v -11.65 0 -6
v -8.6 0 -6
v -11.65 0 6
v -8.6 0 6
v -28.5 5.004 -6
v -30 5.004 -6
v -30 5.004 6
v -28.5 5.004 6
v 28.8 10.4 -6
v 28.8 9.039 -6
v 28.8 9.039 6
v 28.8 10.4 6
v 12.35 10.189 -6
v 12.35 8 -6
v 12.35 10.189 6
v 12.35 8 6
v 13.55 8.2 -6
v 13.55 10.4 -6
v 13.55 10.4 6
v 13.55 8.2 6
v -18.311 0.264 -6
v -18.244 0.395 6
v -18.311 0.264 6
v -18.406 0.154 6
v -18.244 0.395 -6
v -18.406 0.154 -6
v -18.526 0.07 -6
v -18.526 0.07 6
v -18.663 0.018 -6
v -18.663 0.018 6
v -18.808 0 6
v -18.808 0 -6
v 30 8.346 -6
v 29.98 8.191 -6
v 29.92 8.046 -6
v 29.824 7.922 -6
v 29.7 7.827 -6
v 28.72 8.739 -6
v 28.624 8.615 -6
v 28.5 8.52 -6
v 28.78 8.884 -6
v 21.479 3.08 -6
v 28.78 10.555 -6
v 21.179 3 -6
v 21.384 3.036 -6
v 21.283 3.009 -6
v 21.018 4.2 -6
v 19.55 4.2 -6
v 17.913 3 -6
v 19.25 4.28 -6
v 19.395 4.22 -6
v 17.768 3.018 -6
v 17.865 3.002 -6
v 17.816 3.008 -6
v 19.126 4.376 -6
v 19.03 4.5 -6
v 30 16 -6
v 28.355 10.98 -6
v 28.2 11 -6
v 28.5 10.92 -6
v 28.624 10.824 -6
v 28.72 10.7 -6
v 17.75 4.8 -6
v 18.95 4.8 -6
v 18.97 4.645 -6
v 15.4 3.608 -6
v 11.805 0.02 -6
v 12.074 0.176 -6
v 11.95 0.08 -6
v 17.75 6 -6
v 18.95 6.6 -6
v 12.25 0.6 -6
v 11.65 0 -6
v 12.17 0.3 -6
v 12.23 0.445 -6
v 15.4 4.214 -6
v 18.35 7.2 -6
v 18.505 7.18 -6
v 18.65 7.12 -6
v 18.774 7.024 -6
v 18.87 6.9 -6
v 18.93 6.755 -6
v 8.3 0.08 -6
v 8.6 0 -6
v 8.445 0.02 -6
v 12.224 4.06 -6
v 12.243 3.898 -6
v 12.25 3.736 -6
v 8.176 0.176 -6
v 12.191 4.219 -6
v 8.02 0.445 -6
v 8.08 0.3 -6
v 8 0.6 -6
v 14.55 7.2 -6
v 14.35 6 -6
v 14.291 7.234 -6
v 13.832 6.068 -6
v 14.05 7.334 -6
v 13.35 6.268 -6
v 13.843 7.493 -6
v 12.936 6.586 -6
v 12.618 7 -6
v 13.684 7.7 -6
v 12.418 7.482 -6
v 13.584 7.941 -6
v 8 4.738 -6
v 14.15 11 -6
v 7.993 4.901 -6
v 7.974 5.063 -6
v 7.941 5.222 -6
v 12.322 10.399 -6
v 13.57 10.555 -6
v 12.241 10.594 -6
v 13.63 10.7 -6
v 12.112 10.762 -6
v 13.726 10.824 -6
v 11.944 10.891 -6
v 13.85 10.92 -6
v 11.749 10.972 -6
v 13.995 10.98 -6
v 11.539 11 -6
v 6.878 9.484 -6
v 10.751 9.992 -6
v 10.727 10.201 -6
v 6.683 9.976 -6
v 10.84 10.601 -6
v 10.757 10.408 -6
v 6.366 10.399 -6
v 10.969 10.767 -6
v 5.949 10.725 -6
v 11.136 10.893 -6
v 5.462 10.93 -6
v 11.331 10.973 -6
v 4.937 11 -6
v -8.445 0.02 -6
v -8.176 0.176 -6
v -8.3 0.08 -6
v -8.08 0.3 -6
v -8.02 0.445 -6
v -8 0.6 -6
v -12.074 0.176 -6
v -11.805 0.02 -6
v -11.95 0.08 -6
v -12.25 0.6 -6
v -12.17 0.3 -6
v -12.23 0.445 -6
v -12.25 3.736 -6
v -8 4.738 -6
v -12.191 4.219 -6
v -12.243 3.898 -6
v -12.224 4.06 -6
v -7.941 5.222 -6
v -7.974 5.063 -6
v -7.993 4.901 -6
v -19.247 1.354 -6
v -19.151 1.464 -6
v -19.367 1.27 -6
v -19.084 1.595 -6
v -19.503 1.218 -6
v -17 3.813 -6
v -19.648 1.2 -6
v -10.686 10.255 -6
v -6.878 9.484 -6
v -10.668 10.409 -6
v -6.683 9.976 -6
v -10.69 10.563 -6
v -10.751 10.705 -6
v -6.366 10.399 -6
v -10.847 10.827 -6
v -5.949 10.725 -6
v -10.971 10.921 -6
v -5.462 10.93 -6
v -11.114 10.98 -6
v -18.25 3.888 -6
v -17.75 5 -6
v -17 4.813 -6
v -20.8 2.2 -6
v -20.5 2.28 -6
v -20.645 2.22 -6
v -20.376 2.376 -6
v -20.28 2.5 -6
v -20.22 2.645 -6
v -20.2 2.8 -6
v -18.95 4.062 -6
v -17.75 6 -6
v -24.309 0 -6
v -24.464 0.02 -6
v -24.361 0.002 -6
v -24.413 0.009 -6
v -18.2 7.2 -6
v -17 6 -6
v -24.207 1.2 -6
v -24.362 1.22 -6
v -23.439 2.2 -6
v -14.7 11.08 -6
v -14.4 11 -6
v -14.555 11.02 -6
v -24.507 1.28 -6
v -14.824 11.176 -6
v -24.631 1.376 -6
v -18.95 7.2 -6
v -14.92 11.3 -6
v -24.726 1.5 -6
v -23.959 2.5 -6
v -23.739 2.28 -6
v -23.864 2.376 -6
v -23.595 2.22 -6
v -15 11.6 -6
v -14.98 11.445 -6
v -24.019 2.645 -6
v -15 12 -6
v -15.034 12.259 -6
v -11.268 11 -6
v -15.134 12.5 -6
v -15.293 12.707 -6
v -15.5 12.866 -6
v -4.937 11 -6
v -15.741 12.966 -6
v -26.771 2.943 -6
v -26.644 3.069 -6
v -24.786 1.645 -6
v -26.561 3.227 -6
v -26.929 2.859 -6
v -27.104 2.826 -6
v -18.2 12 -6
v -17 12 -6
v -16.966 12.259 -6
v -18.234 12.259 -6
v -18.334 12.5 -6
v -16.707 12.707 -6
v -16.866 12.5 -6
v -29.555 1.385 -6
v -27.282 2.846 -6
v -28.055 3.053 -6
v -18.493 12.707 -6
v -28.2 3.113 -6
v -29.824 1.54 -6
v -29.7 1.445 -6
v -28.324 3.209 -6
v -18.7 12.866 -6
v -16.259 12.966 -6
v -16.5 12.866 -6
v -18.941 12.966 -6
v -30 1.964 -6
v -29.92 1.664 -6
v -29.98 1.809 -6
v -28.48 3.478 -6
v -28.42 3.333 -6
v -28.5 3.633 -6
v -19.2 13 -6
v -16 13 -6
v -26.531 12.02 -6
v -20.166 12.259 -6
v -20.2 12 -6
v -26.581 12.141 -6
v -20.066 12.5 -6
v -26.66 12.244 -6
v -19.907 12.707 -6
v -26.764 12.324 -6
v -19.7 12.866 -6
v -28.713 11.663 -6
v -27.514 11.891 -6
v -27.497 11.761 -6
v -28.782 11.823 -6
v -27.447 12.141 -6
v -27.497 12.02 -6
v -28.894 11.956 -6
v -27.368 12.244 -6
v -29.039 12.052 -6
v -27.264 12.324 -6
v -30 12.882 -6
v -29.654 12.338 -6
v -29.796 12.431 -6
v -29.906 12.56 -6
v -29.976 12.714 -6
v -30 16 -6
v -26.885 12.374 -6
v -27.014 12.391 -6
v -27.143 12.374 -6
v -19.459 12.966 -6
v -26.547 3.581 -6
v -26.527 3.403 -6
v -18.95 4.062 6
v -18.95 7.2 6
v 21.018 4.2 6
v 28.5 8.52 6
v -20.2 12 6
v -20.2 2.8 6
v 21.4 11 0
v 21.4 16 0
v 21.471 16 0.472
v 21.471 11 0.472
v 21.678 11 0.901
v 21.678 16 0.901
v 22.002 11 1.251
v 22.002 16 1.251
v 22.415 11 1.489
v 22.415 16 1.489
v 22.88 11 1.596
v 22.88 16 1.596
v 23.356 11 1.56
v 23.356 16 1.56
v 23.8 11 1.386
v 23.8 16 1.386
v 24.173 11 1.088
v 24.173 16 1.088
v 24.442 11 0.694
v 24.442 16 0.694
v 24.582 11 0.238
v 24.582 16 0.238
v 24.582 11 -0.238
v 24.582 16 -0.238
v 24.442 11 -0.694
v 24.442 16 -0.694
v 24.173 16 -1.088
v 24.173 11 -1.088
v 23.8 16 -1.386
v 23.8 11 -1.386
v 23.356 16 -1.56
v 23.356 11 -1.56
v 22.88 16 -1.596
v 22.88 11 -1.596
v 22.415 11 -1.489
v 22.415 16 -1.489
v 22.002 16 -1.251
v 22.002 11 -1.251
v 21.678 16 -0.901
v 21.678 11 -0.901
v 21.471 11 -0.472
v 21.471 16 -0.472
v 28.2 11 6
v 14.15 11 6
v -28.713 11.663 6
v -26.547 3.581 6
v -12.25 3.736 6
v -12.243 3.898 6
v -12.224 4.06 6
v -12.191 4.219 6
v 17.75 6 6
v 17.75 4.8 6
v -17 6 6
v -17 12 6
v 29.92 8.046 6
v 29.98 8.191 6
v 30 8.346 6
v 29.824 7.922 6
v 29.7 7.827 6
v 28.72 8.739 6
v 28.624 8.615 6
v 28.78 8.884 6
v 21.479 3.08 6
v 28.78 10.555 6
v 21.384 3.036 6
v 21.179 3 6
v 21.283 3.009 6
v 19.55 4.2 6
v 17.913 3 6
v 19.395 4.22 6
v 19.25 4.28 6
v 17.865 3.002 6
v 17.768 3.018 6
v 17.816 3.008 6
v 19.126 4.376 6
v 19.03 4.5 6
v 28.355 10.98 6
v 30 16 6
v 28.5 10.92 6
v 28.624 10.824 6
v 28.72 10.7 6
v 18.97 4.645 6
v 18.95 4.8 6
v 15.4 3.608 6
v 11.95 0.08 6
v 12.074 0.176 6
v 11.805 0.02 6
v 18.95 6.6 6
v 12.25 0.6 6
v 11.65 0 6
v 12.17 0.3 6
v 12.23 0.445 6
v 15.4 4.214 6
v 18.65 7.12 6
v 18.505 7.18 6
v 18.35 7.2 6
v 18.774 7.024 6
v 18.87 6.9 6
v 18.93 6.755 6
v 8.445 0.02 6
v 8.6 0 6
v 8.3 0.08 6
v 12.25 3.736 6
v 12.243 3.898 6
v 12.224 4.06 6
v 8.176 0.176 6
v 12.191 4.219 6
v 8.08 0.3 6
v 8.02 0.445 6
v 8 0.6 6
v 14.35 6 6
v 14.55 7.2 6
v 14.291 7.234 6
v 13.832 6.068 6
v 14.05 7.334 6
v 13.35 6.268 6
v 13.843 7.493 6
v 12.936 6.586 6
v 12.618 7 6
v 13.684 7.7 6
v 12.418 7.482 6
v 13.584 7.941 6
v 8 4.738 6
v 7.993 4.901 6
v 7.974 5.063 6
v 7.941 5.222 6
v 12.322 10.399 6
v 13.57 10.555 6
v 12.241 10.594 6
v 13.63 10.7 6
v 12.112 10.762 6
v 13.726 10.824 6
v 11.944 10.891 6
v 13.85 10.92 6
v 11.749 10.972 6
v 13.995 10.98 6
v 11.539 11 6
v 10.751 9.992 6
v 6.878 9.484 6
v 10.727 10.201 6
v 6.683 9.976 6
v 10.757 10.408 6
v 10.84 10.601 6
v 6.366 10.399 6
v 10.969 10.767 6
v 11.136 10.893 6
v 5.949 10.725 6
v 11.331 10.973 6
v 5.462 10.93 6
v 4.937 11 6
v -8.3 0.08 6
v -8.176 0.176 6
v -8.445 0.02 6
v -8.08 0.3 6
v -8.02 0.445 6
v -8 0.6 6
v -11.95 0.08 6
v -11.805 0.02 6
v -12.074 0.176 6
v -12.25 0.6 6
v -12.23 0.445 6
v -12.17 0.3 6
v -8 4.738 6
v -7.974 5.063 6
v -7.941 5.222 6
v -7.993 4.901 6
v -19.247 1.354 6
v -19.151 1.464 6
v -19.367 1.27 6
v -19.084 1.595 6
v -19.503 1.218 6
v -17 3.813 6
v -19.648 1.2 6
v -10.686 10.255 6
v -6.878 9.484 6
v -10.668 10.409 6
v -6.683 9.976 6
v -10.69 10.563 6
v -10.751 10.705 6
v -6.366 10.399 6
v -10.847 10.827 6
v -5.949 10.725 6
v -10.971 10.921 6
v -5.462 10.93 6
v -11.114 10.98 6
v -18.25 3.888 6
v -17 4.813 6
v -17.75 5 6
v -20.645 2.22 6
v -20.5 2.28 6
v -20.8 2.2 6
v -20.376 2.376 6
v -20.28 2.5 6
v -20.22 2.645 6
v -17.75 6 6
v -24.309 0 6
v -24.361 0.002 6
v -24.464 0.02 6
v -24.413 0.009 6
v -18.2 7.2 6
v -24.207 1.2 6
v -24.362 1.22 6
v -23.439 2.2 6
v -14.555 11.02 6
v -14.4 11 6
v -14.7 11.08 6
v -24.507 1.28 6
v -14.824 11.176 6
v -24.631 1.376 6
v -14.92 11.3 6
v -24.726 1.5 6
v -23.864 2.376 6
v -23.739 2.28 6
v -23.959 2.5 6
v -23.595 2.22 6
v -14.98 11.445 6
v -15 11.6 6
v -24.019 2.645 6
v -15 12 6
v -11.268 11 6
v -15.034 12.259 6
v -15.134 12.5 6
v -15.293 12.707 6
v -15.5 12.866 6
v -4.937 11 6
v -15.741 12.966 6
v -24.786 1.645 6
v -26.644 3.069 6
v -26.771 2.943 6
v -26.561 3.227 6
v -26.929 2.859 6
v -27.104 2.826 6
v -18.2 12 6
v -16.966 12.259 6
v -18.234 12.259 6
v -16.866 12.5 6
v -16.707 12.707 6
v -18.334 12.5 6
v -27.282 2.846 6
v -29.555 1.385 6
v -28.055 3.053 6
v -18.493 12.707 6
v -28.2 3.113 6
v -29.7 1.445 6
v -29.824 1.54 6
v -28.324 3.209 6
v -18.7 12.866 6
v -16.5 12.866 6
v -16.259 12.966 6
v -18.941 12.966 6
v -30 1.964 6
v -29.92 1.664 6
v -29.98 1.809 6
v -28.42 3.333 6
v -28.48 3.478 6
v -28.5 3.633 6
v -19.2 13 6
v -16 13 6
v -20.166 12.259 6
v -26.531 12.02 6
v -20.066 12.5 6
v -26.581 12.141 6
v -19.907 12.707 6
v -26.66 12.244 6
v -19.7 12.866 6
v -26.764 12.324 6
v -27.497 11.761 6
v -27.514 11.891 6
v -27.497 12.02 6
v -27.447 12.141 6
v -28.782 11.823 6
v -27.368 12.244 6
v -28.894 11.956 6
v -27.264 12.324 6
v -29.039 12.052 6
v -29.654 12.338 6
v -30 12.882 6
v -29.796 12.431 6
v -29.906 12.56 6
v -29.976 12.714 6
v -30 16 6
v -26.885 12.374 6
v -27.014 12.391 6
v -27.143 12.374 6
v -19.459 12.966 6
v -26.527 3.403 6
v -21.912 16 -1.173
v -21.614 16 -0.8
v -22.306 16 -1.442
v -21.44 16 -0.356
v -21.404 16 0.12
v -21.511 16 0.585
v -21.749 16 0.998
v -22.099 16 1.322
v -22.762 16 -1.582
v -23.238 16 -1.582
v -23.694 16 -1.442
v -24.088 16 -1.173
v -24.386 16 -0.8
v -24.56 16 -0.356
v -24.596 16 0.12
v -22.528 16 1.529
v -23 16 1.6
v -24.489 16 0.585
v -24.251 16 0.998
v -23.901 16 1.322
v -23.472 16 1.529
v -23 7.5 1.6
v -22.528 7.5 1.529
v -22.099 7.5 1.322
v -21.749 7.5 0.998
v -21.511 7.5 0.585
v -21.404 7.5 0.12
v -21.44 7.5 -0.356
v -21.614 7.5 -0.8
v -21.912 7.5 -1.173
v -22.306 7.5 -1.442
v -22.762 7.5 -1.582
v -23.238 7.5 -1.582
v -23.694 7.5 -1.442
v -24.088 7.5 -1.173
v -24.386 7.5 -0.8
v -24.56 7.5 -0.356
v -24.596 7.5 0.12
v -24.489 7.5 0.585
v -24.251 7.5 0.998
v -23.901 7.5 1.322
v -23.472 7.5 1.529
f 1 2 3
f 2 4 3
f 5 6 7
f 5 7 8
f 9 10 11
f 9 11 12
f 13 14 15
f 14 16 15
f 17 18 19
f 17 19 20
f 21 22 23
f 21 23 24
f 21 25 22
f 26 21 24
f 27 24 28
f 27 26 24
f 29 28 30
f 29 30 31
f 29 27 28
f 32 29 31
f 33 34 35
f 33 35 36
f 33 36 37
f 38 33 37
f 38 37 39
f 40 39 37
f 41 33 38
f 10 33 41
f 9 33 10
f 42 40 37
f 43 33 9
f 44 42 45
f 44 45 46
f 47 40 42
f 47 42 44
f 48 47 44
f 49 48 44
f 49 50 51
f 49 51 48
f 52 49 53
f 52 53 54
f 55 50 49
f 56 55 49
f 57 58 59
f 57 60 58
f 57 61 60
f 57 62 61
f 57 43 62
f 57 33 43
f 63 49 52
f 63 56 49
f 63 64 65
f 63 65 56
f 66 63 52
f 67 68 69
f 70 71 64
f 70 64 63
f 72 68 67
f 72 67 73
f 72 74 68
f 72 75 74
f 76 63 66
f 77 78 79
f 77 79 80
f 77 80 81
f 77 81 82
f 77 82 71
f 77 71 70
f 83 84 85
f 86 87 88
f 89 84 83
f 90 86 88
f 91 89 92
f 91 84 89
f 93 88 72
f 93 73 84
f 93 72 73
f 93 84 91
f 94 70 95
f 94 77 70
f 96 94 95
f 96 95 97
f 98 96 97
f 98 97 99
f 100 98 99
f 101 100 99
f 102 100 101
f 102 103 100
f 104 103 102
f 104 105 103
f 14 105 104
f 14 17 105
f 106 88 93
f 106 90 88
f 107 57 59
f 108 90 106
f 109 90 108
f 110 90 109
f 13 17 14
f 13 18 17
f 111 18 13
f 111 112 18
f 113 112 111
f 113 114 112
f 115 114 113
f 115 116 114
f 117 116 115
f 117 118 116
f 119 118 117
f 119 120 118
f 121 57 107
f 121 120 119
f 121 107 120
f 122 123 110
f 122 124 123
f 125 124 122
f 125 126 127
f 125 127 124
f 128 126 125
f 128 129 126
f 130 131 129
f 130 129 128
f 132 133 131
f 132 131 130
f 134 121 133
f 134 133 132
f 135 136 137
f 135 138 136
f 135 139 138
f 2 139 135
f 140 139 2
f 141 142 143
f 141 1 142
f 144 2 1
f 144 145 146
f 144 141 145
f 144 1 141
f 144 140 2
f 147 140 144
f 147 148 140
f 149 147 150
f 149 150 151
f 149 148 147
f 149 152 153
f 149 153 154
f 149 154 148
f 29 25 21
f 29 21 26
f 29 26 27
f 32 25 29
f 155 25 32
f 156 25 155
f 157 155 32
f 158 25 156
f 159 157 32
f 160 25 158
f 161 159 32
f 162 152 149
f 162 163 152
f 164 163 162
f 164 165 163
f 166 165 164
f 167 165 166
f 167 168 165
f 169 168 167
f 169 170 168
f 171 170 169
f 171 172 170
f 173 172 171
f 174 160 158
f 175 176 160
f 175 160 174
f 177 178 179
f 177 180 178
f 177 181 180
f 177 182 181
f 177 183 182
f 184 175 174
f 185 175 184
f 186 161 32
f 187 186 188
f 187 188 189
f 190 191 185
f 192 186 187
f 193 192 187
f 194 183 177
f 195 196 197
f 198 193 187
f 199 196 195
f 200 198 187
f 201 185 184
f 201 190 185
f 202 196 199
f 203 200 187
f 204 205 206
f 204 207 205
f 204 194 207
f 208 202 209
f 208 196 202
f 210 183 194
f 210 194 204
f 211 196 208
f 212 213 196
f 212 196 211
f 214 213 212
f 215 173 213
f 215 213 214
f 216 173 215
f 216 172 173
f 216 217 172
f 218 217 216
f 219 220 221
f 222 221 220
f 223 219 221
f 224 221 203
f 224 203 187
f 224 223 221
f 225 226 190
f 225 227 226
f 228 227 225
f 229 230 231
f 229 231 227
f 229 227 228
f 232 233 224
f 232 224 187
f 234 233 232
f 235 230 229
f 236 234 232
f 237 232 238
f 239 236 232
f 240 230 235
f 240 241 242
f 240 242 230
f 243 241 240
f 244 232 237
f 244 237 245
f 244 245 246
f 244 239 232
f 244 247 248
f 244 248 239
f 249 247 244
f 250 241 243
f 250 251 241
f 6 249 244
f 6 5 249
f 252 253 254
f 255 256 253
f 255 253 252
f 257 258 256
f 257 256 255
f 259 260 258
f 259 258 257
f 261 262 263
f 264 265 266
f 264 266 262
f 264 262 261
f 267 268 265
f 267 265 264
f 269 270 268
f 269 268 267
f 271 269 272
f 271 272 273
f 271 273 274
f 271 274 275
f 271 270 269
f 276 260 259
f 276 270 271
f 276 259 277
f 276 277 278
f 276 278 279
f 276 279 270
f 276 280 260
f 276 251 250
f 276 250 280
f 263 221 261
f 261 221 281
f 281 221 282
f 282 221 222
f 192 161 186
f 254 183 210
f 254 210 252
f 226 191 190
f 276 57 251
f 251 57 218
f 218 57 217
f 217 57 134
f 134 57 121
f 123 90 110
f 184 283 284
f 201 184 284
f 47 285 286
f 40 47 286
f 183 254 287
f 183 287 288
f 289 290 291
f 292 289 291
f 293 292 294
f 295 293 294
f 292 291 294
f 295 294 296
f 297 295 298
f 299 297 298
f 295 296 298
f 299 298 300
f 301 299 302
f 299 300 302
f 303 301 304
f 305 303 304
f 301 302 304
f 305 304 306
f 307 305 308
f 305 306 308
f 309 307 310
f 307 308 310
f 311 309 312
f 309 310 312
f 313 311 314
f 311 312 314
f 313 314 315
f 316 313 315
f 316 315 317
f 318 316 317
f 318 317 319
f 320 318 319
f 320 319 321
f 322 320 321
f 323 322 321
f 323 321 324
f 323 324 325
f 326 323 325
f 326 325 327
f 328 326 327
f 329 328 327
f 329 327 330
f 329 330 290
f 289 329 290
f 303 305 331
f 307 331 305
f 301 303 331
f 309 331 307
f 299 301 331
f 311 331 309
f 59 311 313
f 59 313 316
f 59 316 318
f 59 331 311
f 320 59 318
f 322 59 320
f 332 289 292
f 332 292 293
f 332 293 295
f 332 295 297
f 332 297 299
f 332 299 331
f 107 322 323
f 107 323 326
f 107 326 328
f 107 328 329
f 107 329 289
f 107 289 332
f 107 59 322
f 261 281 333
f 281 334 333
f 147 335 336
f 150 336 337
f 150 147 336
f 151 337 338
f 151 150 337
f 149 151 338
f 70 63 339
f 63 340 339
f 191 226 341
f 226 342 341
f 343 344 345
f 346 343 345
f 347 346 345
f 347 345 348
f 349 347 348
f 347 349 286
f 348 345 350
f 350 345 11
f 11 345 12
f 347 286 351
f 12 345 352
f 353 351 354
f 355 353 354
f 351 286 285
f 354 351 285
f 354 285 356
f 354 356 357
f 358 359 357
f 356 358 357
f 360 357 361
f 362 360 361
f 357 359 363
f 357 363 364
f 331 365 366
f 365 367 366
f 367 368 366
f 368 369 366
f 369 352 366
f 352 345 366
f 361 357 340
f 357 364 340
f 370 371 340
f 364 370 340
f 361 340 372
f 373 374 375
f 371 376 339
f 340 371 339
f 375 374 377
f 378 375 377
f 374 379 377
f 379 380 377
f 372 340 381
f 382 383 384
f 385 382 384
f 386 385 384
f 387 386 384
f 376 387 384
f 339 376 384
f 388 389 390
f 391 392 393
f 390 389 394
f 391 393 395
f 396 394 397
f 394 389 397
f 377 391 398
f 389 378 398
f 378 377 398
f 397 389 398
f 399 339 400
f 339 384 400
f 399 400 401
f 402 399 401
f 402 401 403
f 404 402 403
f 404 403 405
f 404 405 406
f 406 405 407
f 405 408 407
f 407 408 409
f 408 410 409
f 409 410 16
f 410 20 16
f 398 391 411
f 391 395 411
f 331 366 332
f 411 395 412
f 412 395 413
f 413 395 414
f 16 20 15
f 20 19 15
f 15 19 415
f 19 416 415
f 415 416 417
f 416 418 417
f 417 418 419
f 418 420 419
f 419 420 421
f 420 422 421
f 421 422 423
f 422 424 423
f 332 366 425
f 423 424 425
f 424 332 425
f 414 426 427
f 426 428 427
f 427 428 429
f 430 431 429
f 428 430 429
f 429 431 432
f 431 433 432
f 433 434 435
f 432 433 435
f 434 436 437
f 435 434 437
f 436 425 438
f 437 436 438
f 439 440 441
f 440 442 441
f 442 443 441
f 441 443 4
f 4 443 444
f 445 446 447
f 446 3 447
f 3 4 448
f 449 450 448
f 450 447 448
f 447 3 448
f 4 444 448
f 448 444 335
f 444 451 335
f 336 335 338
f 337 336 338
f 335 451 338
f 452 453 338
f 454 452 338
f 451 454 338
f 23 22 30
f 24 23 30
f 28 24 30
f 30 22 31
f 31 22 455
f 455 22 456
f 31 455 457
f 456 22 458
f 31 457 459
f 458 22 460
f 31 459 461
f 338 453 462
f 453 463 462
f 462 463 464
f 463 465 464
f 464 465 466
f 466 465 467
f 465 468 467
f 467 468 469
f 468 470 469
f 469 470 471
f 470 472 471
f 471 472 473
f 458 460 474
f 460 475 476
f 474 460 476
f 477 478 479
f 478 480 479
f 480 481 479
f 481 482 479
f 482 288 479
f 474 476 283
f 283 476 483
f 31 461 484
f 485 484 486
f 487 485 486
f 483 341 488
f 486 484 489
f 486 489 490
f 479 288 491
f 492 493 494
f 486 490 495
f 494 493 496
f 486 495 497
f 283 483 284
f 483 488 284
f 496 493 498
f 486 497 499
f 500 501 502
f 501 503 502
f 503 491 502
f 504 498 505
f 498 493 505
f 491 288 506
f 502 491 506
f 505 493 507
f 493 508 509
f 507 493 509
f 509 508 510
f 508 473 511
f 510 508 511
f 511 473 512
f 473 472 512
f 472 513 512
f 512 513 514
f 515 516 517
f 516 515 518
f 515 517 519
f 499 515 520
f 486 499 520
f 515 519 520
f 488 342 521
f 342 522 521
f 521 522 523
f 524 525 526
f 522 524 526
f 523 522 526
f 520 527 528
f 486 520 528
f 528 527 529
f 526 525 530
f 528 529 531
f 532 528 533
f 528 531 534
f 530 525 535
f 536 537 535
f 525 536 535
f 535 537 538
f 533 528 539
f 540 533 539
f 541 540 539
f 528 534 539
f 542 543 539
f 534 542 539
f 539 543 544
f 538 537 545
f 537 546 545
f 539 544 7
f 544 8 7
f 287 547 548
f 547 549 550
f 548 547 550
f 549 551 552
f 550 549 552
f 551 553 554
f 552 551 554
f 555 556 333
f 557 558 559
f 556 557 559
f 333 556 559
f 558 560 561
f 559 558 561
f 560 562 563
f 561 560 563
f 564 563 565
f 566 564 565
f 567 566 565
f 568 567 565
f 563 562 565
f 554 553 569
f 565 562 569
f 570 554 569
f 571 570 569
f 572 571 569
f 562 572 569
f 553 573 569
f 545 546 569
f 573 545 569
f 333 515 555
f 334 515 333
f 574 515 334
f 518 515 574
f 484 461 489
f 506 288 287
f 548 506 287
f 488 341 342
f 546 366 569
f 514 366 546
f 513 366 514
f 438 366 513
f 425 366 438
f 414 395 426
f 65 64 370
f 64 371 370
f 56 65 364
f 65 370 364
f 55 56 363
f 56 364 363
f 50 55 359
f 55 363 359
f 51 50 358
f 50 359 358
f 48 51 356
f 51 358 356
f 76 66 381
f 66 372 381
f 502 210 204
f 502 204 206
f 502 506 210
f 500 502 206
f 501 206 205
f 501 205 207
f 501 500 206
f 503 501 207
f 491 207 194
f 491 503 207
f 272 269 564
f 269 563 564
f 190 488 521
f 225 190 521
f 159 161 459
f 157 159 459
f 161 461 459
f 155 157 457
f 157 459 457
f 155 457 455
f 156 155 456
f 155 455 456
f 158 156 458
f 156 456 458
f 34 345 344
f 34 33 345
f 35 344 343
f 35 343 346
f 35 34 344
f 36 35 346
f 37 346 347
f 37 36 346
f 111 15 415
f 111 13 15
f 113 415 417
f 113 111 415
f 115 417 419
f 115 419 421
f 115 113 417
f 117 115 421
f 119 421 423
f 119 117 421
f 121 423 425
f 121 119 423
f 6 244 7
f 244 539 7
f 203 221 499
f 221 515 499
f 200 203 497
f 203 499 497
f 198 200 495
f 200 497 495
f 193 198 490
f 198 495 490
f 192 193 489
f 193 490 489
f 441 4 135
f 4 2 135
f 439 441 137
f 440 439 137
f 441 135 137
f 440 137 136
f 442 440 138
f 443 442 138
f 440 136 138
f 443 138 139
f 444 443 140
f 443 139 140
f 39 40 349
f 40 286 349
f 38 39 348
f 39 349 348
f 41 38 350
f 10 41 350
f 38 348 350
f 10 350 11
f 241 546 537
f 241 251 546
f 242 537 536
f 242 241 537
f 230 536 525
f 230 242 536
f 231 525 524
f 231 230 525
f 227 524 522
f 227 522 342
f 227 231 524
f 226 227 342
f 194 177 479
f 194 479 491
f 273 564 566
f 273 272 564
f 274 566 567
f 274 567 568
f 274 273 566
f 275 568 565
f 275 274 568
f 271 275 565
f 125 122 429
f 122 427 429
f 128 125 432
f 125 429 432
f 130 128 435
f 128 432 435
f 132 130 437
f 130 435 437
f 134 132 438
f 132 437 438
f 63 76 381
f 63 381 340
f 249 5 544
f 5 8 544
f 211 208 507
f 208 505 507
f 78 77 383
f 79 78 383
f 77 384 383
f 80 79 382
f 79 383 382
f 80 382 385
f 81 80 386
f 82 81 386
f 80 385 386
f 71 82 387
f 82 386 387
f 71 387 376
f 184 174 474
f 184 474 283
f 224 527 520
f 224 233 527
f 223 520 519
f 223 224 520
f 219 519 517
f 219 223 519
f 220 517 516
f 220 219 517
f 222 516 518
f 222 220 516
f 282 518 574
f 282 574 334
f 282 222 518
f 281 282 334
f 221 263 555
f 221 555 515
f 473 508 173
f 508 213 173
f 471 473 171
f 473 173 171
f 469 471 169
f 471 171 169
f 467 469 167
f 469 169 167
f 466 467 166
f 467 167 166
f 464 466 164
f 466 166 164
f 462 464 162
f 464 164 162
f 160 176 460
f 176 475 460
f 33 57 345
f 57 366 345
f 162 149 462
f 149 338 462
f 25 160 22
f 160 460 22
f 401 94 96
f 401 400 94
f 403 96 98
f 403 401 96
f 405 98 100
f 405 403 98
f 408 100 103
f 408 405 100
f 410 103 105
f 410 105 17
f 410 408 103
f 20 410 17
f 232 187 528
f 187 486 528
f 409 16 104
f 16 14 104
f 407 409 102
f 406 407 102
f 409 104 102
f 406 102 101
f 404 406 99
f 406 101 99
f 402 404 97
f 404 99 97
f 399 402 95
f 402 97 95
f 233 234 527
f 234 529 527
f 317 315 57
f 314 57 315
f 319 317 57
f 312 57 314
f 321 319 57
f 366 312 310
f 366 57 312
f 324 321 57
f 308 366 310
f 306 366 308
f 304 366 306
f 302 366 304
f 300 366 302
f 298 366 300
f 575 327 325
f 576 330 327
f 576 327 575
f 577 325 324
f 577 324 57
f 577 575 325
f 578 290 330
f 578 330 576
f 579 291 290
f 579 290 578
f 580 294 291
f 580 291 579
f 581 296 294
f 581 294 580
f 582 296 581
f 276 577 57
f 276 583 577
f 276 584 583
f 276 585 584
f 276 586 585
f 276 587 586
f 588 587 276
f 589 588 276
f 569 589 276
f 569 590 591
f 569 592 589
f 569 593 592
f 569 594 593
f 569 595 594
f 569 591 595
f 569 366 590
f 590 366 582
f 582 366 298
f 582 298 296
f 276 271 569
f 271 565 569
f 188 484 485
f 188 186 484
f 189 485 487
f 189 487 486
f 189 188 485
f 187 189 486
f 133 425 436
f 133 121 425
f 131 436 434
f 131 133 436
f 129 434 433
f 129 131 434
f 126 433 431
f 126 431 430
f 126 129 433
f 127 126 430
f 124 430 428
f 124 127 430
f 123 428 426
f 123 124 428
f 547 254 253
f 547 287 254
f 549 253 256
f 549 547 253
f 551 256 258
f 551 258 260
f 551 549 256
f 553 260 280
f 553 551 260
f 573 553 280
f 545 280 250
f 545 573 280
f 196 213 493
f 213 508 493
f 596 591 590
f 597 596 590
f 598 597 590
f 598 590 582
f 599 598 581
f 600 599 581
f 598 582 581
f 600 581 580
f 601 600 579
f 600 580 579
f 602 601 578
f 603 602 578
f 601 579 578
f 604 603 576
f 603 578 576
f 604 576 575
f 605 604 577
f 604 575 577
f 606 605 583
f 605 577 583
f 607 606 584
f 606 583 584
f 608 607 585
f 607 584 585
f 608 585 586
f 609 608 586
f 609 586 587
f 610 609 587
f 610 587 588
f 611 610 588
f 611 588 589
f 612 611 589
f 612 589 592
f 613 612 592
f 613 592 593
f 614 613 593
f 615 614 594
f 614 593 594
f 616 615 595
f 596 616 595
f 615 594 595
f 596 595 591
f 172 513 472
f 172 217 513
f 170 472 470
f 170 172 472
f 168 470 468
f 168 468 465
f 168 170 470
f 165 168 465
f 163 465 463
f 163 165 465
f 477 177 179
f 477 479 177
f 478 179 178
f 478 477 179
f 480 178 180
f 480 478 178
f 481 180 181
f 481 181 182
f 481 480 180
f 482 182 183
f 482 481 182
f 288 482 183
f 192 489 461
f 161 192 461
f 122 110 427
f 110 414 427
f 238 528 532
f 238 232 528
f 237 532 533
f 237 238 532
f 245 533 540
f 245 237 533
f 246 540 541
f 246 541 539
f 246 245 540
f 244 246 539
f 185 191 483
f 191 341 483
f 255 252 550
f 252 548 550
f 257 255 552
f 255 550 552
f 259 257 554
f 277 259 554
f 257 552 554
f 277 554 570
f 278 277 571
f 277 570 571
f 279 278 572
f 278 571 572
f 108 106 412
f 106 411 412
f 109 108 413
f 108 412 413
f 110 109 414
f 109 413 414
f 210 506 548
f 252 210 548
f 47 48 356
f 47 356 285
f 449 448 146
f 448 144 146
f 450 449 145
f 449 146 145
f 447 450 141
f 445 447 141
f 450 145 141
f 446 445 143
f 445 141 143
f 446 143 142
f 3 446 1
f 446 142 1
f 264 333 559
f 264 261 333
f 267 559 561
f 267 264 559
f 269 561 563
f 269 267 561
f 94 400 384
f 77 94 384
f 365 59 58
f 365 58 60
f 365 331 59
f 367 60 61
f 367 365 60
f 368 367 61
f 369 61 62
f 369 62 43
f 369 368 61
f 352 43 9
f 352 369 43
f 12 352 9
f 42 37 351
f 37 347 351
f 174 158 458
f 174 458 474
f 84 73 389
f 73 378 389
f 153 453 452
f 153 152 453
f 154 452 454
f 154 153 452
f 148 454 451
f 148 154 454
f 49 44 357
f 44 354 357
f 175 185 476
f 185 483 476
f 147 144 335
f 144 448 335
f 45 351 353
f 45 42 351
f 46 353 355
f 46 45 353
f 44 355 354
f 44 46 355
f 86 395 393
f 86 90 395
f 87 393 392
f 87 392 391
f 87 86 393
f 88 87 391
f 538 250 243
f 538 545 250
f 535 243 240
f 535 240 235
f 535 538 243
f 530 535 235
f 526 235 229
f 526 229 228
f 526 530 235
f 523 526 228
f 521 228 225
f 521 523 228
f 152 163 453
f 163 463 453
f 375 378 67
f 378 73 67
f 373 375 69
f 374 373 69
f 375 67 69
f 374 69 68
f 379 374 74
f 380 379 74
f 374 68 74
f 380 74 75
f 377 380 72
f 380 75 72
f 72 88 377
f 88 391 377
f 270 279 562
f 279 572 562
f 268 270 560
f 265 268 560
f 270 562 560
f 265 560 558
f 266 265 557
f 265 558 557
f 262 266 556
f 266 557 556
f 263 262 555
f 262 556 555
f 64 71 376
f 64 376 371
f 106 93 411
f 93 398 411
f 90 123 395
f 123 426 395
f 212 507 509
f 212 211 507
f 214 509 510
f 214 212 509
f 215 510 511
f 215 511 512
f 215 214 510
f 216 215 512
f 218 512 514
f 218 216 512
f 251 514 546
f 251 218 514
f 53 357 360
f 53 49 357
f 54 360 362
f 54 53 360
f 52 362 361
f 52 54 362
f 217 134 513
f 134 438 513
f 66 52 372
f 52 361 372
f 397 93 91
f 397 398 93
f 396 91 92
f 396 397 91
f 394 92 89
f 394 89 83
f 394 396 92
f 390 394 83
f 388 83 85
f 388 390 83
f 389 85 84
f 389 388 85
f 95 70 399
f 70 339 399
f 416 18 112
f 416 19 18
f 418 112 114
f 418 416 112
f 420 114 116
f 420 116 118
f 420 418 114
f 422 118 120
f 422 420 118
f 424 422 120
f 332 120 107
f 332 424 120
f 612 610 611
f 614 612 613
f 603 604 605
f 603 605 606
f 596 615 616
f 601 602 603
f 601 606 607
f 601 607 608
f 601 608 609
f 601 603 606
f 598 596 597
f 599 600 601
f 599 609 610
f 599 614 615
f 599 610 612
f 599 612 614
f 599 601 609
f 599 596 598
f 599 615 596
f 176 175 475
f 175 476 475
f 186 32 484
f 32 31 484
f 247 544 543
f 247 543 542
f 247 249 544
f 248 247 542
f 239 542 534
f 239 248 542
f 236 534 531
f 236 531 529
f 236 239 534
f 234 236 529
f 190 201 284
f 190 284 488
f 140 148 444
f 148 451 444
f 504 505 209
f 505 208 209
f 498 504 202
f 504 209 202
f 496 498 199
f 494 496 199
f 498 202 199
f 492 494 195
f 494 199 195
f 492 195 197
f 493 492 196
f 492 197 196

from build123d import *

# Parameters (mm, degrees)
BOSS_EXTRUDE1_DEPTH     = 6
CUT_EXTRUDE1_DEPTH      = 35.525353003
CUT_EXTRUDE1_DEPTH_BACK = 35.525353003
FILLET1_R               = 2
FILLET2_R               = 1
FILLET3_R               = 0.811424
FILLET4_R               = 2
FILLET5_R               = 1
FILLET6_R               = 1
FILLET7_R               = 0.5
FILLET8_R               = 0.6
SKETCH4_R               = 1.6
CUT_EXTRUDE2_DEPTH      = 8.5


with BuildPart() as part:
    # Sketch2 → Boss-Extrude1 (new, symmetric)
    with BuildSketch(Plane.XY):
        Polygon((6.5, 11), (-6.5, 11), (-8, 4.9838286), (-8, 0), (-12.25, 0), (-12.25, 3.981133366), (-10.5, 11), (-15, 11), (-15, 13), (-17, 13), (-17, 6), (-17.75, 6), (-17.75, 5), (-17, 4.813003998), (-17, 3.813003998), (-18.387819958, 0), (-24.387819958, 0), (-30, 1.50377911), (-30, 5.00377911), (-28.5, 5.00377911), (-28.5, 3.172407682), (-26.2783706, 2.577123878), (-28.785442178, 11.933642386), (-30, 12.5), (-30, 16), (0, 16), (30, 16), (30, 8), (21.339745962, 3), (17.839745962, 3), (15.4, 3.608296988), (15.4, 4.214079193), (17.75, 4.8), (17.75, 6), (12.35, 6), (12.35, 11), (10.5, 11), (12.25, 3.981133366), (12.25, 0), (8, 0), (8, 4.9838286), align=None)
    extrude(amount=BOSS_EXTRUDE1_DEPTH, both=True)

    # Sketch3 → Cut-Extrude1 (cut, two sides: drawn at the far end of the back side and taken through both)
    with BuildSketch(Plane.XY.offset(-CUT_EXTRUDE1_DEPTH_BACK)):
        Polygon((-27.626331186, 12.24422524), (-24.667039952, 1.2), (-19.228069004, 1.2), (-18.249764702, 3.88786898), (-18.95, 4.062457248), (-18.95, 7.2), (-18.2, 7.2), (-18.2, 13), (-20.2, 13), (-20.2, 2.2), (-23.899712964, 2.2), (-26.66040536, 12.503044285), align=None)
        Polygon((13.55, 11), (13.55, 7.2), (18.95, 7.2), (18.95, 4.2), (21.018206931, 4.2), (28.8, 8.692820323), (28.8, 11), align=None)
    extrude(amount=CUT_EXTRUDE1_DEPTH + CUT_EXTRUDE1_DEPTH_BACK, mode=Mode.SUBTRACT)

    # Fillet1
    fillet1_edges = [part.edges().sort_by_distance(p)[0] for p in [
        (12.35, 6, 0),
    ]]
    fillet(fillet1_edges, radius=FILLET1_R)

    # Fillet2
    fillet2_edges = [part.edges().sort_by_distance(p)[0] for p in [
        (13.55, 7.2, 0),
    ]]
    fillet(fillet2_edges, radius=FILLET2_R)

    # Fillet3
    fillet3_edges = [part.edges().sort_by_distance(p)[0] for p in [
        (12.35, 11, 0),
        (10.5, 11, 0),
    ]]
    fillet(fillet3_edges, radius=FILLET3_R)

    # Fillet4
    fillet4_edges = [part.edges().sort_by_distance(p)[0] for p in [
        (12.25, 3.981133366, 0),
        (8, 4.9838286, 0),
        (6.5, 11, 0),
        (-6.5, 11, 0),
        (-8, 4.9838286, 0),
        (-12.25, 3.981133366, 0),
    ]]
    fillet(fillet4_edges, radius=FILLET4_R)

    # Fillet5
    fillet5_edges = [part.edges().sort_by_distance(p)[0] for p in [
        (-20.2, 13, 0),
        (-18.2, 13, 0),
    ]]
    fillet(fillet5_edges, radius=FILLET5_R - 0.0001)  # a hair under: the kernel refuses the full size

    # Fillet6
    fillet6_edges = [part.edges().sort_by_distance(p)[0] for p in [
        (-15, 13, 0),
        (-17, 13, 0),
    ]]
    fillet(fillet6_edges, radius=FILLET6_R - 0.0001)  # a hair under: the kernel refuses the full size

    # Fillet7
    fillet7_edges = [part.edges().sort_by_distance(p)[0] for p in [
        (-27.626331186, 12.24422524, 0),
        (-26.66040536, 12.503044285, 0),
    ]]
    fillet(fillet7_edges, radius=FILLET7_R - 0.0001)  # a hair under: the kernel refuses the full size

    # Fillet8
    fillet8_edges = [part.edges().sort_by_distance(p)[0] for p in [
        (-23.899712964, 2.2, 0),
        (-20.2, 2.2, 0),
        (-19.228069004, 1.2, 0),
        (-24.667039952, 1.2, 0),
        (13.55, 11, 0),
        (28.8, 11, 0),
        (28.8, 8.692820323, 0),
        (18.95, 4.2, 0),
        (18.95, 7.2, 0),
        (12.25, 0, 0),
        (8, 0, 0),
        (-8, 0, 0),
        (-12.25, 0, 0),
        (-10.5, 11, 0),
        (-15, 11, 0),
        (-18.387819958, 0, 0),
        (-24.387819958, 0, 0),
        (-30, 1.50377911, 0),
        (-28.5, 3.172407682, 0),
        (-26.2783706, 2.577123878, 0),
        (-28.785442178, 11.933642386, 0),
        (-30, 12.5, 0),
        (30, 8, 0),
        (21.339745962, 3, 0),
        (17.839745962, 3, 0),
    ]]
    fillet(fillet8_edges, radius=FILLET8_R)

    # Sketch4 → Cut-Extrude2 (cut)
    with BuildSketch(Plane(origin=(0, 16, 0), x_dir=(1, 0, 0), z_dir=(0, 1, 0))):
        with Locations(Location((-23, 0, 0), (0, 0, 270))):
            Circle(SKETCH4_R)
        with Locations(Location((23, 0, 0), (0, 0, 180))):
            Circle(SKETCH4_R)
    extrude(amount=-CUT_EXTRUDE2_DEPTH, mode=Mode.SUBTRACT)


solid = part.part
